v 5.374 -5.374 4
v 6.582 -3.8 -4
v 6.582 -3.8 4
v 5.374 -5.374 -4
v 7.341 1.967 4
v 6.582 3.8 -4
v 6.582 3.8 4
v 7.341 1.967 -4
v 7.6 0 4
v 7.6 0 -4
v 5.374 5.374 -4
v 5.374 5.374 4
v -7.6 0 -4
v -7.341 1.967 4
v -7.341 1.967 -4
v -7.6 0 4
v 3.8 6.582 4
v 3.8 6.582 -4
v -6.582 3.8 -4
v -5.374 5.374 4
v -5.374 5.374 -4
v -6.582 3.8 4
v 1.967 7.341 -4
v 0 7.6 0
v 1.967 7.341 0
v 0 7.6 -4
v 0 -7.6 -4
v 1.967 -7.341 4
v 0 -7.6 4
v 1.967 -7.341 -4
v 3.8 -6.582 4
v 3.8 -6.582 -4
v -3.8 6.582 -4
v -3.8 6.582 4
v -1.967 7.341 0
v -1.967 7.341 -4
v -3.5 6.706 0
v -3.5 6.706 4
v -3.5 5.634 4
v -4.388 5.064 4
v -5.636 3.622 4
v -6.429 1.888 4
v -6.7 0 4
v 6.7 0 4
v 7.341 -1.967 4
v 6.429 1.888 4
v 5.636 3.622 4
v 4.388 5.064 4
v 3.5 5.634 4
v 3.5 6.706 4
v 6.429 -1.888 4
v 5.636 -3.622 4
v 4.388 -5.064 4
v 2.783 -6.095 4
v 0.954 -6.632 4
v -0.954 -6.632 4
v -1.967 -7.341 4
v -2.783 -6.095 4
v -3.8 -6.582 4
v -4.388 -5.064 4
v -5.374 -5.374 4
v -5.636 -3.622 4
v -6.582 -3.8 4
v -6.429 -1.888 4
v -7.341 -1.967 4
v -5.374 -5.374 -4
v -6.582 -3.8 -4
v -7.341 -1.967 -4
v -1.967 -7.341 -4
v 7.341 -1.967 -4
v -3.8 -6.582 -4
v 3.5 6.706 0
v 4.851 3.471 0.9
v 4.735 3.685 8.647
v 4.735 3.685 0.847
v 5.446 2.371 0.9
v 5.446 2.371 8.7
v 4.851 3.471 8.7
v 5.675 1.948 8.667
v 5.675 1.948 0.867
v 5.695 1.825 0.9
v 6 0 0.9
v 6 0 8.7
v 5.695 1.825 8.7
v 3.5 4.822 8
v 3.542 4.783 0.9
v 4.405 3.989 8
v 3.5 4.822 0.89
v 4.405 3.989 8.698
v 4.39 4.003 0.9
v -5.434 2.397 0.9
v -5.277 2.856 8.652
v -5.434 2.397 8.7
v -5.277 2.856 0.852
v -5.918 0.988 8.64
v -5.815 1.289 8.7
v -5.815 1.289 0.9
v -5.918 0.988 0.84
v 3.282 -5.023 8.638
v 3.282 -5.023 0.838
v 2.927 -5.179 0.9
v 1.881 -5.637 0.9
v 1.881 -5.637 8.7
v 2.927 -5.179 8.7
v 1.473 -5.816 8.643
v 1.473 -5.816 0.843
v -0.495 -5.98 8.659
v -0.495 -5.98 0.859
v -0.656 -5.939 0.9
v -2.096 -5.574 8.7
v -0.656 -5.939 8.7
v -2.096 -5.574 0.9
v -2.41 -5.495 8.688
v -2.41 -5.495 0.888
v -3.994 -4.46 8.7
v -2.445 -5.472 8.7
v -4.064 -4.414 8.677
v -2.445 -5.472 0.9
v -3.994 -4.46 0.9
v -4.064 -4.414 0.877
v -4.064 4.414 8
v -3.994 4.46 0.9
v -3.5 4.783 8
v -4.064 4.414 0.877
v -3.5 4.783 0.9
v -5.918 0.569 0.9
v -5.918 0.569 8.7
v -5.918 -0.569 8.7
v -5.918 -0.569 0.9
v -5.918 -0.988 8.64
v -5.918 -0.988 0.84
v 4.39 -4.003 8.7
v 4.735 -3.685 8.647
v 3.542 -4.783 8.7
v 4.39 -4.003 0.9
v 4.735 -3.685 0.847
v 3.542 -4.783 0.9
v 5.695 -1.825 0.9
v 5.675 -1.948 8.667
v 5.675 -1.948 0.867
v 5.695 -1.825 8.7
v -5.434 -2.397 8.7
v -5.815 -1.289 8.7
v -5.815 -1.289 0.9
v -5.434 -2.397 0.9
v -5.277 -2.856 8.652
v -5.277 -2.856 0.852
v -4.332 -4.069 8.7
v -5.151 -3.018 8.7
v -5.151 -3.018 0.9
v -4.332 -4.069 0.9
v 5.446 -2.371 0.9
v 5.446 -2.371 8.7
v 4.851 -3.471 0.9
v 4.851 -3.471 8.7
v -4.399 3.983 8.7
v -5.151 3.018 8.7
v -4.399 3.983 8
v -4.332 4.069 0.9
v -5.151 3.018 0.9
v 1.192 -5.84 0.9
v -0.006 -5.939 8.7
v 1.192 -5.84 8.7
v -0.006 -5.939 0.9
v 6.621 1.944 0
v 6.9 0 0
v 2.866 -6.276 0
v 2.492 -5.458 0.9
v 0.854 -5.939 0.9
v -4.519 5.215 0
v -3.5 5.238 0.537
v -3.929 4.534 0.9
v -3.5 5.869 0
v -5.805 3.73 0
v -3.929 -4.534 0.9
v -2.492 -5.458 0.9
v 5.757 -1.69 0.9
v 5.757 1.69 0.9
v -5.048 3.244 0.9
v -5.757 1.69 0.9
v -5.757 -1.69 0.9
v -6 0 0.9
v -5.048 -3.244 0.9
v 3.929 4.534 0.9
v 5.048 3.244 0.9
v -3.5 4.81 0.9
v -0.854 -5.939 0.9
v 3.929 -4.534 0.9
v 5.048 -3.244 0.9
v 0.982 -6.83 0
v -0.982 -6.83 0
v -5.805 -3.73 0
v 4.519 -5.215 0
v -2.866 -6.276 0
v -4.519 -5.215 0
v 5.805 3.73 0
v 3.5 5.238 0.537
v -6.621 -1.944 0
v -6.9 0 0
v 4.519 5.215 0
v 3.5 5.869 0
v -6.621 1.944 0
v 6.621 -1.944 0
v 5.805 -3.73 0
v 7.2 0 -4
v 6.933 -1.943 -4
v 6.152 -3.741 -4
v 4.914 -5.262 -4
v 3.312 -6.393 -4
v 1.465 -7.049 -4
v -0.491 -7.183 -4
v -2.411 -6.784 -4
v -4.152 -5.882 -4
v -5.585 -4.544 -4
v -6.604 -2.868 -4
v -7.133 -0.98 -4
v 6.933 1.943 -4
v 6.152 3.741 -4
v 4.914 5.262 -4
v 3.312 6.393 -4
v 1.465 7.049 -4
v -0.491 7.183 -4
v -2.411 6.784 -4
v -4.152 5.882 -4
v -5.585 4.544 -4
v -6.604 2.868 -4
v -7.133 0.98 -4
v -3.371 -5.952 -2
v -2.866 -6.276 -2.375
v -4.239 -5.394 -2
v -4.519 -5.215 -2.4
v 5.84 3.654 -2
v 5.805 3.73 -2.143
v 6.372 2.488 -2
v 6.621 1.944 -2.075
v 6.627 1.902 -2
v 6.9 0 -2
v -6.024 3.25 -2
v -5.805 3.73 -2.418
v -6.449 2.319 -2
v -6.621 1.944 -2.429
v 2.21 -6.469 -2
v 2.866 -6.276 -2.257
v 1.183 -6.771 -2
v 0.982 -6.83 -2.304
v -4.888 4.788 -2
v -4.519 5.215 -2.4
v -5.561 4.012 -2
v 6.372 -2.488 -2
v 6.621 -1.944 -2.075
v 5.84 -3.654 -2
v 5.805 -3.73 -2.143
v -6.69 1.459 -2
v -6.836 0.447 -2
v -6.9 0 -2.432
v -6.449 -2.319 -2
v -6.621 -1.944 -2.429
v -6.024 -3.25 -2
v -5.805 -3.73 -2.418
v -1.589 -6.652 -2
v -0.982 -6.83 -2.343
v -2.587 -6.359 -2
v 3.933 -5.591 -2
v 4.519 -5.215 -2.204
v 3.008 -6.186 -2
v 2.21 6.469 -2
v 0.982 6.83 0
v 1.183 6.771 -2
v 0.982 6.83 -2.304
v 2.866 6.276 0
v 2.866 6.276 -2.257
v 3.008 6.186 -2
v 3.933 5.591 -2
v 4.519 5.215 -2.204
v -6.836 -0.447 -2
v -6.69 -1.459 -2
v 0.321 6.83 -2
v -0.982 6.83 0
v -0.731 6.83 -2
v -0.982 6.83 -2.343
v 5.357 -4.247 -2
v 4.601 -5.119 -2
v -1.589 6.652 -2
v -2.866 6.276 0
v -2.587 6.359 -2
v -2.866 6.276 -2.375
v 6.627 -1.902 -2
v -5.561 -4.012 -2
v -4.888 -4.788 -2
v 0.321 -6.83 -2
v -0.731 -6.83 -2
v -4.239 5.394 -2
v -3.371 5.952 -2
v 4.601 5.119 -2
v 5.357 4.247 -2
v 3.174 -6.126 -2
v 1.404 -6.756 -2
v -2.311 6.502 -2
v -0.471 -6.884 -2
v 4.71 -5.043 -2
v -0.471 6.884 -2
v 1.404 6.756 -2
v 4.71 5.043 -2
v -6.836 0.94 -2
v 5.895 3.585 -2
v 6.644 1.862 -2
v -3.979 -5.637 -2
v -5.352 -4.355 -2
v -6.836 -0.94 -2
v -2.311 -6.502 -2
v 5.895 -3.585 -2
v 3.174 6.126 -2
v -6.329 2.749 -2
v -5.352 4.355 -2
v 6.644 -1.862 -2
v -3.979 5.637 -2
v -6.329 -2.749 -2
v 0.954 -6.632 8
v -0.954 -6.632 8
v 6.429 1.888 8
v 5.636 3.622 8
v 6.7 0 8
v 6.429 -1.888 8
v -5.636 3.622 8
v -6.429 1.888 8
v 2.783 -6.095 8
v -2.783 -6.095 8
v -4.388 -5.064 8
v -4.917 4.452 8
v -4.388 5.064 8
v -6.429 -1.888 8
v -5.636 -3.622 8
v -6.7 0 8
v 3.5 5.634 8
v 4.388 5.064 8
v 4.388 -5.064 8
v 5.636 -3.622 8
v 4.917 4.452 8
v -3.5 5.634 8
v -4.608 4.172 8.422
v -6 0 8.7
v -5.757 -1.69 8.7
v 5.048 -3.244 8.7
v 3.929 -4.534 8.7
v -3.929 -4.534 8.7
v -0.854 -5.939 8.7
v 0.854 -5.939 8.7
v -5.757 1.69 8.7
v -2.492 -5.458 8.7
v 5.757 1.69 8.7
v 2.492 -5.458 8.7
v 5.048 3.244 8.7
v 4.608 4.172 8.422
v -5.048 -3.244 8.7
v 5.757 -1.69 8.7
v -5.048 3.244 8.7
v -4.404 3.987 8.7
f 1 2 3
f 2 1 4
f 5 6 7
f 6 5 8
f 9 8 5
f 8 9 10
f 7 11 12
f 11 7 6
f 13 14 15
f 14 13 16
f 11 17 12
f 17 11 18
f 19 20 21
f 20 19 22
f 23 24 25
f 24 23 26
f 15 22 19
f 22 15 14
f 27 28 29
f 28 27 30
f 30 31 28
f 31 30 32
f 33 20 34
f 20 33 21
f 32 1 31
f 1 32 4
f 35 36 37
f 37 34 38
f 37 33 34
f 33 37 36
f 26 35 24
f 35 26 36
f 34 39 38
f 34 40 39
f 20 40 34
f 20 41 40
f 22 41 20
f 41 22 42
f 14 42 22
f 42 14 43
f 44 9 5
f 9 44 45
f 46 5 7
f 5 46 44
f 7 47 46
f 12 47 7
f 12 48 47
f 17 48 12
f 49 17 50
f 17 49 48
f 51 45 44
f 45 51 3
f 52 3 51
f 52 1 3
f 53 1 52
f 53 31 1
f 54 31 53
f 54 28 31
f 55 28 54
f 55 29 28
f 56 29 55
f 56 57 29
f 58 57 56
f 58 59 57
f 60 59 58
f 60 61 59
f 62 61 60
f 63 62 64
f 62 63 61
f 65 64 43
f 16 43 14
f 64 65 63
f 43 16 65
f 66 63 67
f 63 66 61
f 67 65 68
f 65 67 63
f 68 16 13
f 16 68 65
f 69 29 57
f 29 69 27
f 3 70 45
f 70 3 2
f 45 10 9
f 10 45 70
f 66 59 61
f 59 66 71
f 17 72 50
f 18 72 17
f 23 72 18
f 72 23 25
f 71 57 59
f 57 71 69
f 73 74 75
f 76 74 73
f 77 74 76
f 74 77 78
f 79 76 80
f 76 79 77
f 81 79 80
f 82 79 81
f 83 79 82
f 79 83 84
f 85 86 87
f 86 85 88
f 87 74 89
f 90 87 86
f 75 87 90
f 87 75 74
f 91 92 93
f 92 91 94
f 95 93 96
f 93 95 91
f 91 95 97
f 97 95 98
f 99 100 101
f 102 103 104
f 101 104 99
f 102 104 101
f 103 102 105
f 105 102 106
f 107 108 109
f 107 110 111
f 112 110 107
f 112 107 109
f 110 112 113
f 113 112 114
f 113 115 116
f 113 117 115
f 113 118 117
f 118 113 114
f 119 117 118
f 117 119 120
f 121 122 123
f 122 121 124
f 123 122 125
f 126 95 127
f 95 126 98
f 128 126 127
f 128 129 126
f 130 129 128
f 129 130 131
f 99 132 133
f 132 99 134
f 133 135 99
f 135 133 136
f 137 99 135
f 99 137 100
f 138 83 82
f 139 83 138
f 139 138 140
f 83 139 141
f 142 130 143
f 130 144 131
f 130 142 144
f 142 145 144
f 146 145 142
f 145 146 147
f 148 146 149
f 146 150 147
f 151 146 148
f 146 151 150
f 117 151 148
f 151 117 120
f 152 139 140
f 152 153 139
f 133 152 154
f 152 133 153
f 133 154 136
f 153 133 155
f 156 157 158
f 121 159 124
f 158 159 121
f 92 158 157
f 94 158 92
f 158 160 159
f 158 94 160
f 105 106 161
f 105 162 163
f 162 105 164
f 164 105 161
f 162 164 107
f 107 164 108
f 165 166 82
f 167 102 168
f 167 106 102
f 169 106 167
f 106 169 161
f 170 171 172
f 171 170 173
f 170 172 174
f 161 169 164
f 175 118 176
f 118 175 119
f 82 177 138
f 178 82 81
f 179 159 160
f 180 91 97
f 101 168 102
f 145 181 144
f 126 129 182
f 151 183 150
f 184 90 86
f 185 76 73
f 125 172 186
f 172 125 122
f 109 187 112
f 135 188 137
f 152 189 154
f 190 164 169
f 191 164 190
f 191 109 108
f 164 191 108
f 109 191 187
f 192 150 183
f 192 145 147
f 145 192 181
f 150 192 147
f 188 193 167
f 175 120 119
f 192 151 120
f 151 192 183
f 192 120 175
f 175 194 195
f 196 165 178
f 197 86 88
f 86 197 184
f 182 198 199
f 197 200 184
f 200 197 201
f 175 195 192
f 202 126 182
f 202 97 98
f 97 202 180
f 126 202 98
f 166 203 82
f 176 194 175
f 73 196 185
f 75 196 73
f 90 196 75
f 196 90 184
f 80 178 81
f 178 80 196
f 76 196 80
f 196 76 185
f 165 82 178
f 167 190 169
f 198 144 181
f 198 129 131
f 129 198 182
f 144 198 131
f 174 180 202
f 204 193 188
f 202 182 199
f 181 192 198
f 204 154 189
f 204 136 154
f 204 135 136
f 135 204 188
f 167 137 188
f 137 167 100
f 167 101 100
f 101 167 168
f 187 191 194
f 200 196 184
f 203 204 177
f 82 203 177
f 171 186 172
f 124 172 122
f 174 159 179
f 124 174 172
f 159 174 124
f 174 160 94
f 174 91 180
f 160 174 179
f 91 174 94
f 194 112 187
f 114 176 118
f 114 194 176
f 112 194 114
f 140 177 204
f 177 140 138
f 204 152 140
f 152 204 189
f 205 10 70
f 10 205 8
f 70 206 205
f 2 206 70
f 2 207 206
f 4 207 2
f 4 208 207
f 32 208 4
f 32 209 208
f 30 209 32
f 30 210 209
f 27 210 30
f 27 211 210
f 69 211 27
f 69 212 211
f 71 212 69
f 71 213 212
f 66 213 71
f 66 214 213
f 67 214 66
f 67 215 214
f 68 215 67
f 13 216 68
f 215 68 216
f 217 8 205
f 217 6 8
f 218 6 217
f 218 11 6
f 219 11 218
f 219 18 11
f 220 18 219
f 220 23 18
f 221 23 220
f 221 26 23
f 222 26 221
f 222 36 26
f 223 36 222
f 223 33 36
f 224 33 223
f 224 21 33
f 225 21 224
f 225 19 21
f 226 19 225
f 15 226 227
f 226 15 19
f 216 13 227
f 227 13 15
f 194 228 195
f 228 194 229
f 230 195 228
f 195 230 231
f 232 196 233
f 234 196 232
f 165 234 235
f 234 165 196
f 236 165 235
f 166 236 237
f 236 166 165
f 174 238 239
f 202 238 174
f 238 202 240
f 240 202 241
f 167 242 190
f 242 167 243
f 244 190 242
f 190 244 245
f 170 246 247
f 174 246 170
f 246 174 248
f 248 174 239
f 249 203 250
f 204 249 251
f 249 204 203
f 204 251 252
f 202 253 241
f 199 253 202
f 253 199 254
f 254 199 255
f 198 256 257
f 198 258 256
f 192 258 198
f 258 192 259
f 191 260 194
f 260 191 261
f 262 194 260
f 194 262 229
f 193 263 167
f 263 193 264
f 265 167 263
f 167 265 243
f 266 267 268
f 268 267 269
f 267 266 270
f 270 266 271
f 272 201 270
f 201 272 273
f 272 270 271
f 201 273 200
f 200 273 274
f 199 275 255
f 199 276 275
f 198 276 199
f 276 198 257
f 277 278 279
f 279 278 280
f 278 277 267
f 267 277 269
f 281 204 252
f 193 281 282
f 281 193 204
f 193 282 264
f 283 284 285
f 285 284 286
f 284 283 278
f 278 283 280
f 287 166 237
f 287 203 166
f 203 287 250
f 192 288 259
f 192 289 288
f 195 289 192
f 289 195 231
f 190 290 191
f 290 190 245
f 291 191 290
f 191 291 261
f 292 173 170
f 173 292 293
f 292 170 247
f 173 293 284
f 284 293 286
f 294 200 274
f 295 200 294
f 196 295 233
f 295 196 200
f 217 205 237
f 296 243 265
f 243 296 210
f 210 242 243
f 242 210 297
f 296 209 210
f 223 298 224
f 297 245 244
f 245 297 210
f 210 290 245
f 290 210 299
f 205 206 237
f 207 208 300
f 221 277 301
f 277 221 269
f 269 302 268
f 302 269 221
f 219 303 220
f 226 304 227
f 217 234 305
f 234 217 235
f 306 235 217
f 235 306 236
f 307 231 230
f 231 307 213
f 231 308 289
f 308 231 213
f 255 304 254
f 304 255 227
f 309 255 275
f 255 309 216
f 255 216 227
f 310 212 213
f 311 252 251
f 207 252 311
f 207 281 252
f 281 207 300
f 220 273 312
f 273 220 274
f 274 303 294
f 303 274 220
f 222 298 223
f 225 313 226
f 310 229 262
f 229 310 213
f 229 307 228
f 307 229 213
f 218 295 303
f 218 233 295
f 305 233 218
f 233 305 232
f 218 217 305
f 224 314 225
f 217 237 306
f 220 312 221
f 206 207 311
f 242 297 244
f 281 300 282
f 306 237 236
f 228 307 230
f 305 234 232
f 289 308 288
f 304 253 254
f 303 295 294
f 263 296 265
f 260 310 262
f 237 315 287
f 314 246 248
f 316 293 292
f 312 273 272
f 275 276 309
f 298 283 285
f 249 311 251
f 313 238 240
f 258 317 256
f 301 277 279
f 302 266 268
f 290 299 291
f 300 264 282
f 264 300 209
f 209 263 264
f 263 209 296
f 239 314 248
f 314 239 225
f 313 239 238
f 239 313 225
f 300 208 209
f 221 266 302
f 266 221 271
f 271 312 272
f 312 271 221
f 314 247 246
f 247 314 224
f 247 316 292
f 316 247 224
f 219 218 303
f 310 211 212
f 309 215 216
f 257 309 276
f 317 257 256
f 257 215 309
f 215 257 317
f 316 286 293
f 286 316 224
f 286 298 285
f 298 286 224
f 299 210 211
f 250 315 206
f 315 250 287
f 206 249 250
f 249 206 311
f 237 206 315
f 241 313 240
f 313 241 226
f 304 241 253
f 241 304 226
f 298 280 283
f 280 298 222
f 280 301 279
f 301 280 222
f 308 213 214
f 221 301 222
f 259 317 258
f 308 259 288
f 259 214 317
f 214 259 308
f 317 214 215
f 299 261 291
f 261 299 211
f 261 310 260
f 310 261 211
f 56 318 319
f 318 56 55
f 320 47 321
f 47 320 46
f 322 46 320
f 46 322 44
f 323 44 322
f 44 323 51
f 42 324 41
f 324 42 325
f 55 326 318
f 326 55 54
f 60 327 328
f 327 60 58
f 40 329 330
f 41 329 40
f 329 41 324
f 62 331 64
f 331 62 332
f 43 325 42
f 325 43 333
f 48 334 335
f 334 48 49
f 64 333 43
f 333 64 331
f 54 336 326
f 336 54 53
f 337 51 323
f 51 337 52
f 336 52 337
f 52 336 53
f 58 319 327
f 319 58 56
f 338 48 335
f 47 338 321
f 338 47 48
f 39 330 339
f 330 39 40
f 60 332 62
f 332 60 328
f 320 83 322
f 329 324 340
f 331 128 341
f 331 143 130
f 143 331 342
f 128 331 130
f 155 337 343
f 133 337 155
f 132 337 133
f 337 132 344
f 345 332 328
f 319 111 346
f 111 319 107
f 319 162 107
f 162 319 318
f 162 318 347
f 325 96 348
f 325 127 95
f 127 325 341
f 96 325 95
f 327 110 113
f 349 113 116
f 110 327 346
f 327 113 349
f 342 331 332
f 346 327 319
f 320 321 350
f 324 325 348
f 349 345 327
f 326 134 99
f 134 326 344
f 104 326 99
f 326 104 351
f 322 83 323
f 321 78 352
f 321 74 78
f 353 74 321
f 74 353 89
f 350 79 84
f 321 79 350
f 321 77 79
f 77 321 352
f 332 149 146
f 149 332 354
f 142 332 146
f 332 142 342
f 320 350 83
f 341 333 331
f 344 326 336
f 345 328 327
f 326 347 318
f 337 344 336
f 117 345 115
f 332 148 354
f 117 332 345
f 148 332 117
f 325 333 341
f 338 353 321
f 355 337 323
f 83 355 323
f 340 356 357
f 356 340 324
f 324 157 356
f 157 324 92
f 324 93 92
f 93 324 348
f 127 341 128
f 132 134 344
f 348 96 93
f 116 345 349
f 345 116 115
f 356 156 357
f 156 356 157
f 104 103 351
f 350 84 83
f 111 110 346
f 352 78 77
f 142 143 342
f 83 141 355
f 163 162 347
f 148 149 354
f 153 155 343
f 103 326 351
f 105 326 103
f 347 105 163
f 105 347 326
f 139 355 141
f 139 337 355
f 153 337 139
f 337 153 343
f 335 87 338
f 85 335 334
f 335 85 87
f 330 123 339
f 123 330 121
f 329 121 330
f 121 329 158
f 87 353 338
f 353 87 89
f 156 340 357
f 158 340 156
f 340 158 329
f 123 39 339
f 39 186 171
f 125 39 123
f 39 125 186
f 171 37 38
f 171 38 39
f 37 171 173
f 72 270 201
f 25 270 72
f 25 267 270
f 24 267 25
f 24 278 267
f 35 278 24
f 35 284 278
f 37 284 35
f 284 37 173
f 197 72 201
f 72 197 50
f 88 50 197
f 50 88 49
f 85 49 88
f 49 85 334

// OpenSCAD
// file: arc.scad
module sector(radius, height, start, end) {
  intersection() {
    cylinder(r=radius, h=height);
    rotate([0,0,start])
    rotate_extrude(angle=end-start) {
      square([radius,height]);
    }
  }
}

module arc(inner, outer, height, start, end) {
  difference(){
    sector(outer,height,start,end);
    sector(inner,height,0,360);
  }
}

arc(8,10,5,30,60);
// file: segment.scad
use <coupler.scad>;
// Section

module pipe(inner, outer, length) {
  difference() {
    cylinder(r=outer, h=length);
    cylinder(r=inner, h=length);
  }
}

function bevel_height(inner, outer, gap=0.1) = (outer-inner)/2 + gap;

module bevel(inner, outer){
  w = (outer - inner);
  difference(){
    cylinder(r1=inner+w,r2=inner,h=w);
    cylinder(r=inner,h=w);
  }
}

module segment(inner, outer, length, gap=0.1) {
  w = (outer-inner)/2;
  union() {
    difference(){
      pipe(inner, outer, length);
      bevel(inner, outer+gap-w);
    }
    translate([0,0,-coupler_height()]) 
      coupler(inner, outer, false);
    translate([0,0,length + coupler_height()]) {
      coupler(inner, outer, true);
      bevel(inner, inner+w-gap);
    }
  }
}

module first_segment(inner, outer, length, gap=0.1) {
  w = (outer-inner)/2;
  union() {
    pipe(inner, outer, length);
    translate([0,0,length + coupler_height()]) {
      coupler(inner, outer, true);
      bevel(inner, inner+w-gap);
    }
  }
}

module last_segment(inner, outer, length, gap=0.1) {
  w = (outer-inner)/2;
  union() {
    difference(){
      pipe(inner, outer, length);
      bevel(inner, outer+gap-w);
    }
    translate([0,0,-coupler_height()]) 
      coupler(inner, outer, false);
  }
}

d = [4,6,2];

difference() {
  union() {
    first_segment(d.x, d.y, d.z);
    translate([0,0,d.z + coupler_height() + 0.1])
      segment(d.x, d.y, d.z);
    translate([0,0,2*(d.z + coupler_height() + 0.1)])
      last_segment(d.x, d.y, d.z);
  }
  translate([-20,0,0]) cube([50,50,50]);
}
// file: mouthpiece.scad
use <arc.scad>;
use <coupler.scad>;
use <fipple.scad>;
use <segment.scad>;

module mouthpiece(inner, outer, length, width, height,gap=0.1) {
  // bevel = (outer - inner) / 2 - gap;
  bevel = bevel_height(inner, outer, gap);
  excess = coupler_height() + bevel;
  length = length - excess;
  difference() {
    union() {
      first_segment(inner, outer, length);
      cylinder(r=inner, h=length + excess);
    }
    windway(inner, outer, length + excess, width, height);
  }
}

  /*
    / \    |
  r/   \   | h
  /__w__\  |

  s = (r+r+w)/2 = r + w/2
  A = sqrt(s(s-r)(s-r)(s-w))
    = sqrt( s (s-r)^2 (s-w) )
    = sqrt( (r+w/2) (r+w/2-r)^2 (r+w/2-w) )
    = sqrt( (r+w/2) (w/2)^2 (r-w/2) )
    = sqrt( (r^2 - (w/2)^2) (w/2)^2 )
    = (w/2) sqrt(r^2 - (w/2)^2)
  A = wh/2
  h = 2A/w
    = 2/w (w/2) sqrt(r^2 - (w/2)^2)
    = sqrt(r^2 - (w/2)^2)

  // to find w from h
  h2 = r2 - (w/2)2
  r2 - h2 = (w/2)2
  2sqrt(r2 - h2) = w
  */

function inset(inner, width, height) = -height + sqrt(pow(inner,2) - pow(width/2,2));

module windway(inner, outer, length, width, height) {
  offset = inset(inner, width, height);
  rotate([0,0,90]) 
    translate([offset, -width/2 ,0]) 
    cube([height, width, length]);
}
// file: fipple.scad
use <arc.scad>;
use <coupler.scad>;
use <mouthpiece.scad>;
use <segment.scad>;

function lip_radius (inner, width, height) = inset(inner, width, height) + height/2;
function lip_height (inner, outer, width, angle, height) = tan(angle) * (outer - inset(inner, width, height) - height/2);

module lip(inner, outer, width, angle, height) {
  w2 = width/2;
  r = lip_radius(inner, width, height);
  h = lip_height(inner, outer, width, angle, height);
  points = [
    [-w2,r,0],
    [w2,r,0],
    [-w2,outer,0],
    [w2,outer,0],
    [-w2,outer,h],
    [w2,outer,h]
  ];
  faces = [
    [0,1,3,2],
    [1,0,4,5],
    [2,3,5,4],
    [0,2,4],
    [1,5,3]
  ];
  polyhedron(points, faces);
}

module cheek(inner, outer, width) {
  angle = asin((width/2)/inner)/2;
  delta = 30;
  arc(inner, outer, coupler_height(), 90-angle-delta, 90+angle+delta);
}

module chin(inner, outer, length, width, angle, height) {
  r = lip_radius(inner, width, height);
  bottom_offset = max(coupler_height(), lip_height(inner, outer, width, angle, height));
  top_offset = length + coupler_height();
  w = inner-r;
  relief = atan2(-w,top_offset - bottom_offset);

  // 2sqrt(r2 - h2) = w
  w_at_lip = 2*sqrt(inner*inner - r*r);
  intersection() {
    cylinder(r=outer,h=length);
    translate([-w_at_lip/2,r,0]) {
      translate([0,0,bottom_offset]) 
        rotate([relief,0,0]) 
        cube([w_at_lip, outer-r, top_offset-bottom_offset]);
      cube([w_at_lip, outer-r, bottom_offset]);
    }
  }
}

module fipple(inner, outer, length, width, angle, height) {
  difference() {
    union() {
      difference() {
        segment(inner, outer, length);
        rotate([0,0,90])
          translate([0, -width/2, -coupler_height()])
          cube([outer, width, coupler_height()]);
      }
      chin(inner, outer, length, width, angle, height);
      cheek(inner, outer, width);
    }
    lip(inner, outer, width, angle, height);
  }
}

inner = 8;
outer = 10;
length = 40;
width = 5;
angle = 90-20;
height = 2;

fipple(inner, outer, length, width, angle, height);
// lip(inner, outer, width, angle, height);
// file: coupler.scad
use <segment.scad>;

function coupler_height () = 4;

// function gap = 0.4;
elephant_toe = 0.4;

module coupler(inner, outer, is_at_top, gap=0.1){
  h = coupler_height();
  w = (outer - inner) / 2;
  if (is_at_top) {
    translate([0,0,-h]) 
      pipe(inner, outer-w-gap, h);
  } else {
    difference() {
      pipe(inner+w+gap, outer, h);
      cylinder(r2=inner+w+gap, r1=outer-elephant_toe, h/2);
    }

  }
}

module offset_check(){
  intersection(){
    translate([0,-25,-25]) cube([50,50,50]);
    union(){
      segment(8,11,2);
      translate([0,0,2+coupler_height()+.1]) segment(8,11,2);
    }
  }
}

module coupler_tests() {
  // use comprehension to make vector of [gap, [dx, dy]] for one big stl
  gaps = [for (i=[0.0:0.05:0.2]) each [i,i]];
  r = 11;
  dr = r + 3;
  offsets = [for (x=[0:len(gaps)]) each [for (y=[0:1]) [dr*x,dr*y,0]]];
  for (i=[0:len(gaps)-1]) {
    // echo("i:", i, gaps[i], offsets[i]);
    translate(offsets[i]) segment(8/2,11/2,4,gaps[i]);
  }
}

// $fn=100;
// coupler_tests();
offset_check();
// segment(8,11,4,0.1);
// main file
use <coupler.scad>;
use <fipple.scad>;
use <mouthpiece.scad>;
use <segment.scad>;

module window(inner, outer, size, width, height) {
  echo(inner, outer, size, width, height);
  offset = inset(inner, width, height);
  difference() {
    segment(inner, outer, size);
    rotate([0,0,90])
      translate([offset-1, -width/2, 0])
        cube([outer-offset+1, width, size + coupler_height()]);
    translate([0,0,size+coupler_height()]) 
      cheek(inner, outer, width);
  }
}

window(6, 7.6, 4, 7, 1.4);
